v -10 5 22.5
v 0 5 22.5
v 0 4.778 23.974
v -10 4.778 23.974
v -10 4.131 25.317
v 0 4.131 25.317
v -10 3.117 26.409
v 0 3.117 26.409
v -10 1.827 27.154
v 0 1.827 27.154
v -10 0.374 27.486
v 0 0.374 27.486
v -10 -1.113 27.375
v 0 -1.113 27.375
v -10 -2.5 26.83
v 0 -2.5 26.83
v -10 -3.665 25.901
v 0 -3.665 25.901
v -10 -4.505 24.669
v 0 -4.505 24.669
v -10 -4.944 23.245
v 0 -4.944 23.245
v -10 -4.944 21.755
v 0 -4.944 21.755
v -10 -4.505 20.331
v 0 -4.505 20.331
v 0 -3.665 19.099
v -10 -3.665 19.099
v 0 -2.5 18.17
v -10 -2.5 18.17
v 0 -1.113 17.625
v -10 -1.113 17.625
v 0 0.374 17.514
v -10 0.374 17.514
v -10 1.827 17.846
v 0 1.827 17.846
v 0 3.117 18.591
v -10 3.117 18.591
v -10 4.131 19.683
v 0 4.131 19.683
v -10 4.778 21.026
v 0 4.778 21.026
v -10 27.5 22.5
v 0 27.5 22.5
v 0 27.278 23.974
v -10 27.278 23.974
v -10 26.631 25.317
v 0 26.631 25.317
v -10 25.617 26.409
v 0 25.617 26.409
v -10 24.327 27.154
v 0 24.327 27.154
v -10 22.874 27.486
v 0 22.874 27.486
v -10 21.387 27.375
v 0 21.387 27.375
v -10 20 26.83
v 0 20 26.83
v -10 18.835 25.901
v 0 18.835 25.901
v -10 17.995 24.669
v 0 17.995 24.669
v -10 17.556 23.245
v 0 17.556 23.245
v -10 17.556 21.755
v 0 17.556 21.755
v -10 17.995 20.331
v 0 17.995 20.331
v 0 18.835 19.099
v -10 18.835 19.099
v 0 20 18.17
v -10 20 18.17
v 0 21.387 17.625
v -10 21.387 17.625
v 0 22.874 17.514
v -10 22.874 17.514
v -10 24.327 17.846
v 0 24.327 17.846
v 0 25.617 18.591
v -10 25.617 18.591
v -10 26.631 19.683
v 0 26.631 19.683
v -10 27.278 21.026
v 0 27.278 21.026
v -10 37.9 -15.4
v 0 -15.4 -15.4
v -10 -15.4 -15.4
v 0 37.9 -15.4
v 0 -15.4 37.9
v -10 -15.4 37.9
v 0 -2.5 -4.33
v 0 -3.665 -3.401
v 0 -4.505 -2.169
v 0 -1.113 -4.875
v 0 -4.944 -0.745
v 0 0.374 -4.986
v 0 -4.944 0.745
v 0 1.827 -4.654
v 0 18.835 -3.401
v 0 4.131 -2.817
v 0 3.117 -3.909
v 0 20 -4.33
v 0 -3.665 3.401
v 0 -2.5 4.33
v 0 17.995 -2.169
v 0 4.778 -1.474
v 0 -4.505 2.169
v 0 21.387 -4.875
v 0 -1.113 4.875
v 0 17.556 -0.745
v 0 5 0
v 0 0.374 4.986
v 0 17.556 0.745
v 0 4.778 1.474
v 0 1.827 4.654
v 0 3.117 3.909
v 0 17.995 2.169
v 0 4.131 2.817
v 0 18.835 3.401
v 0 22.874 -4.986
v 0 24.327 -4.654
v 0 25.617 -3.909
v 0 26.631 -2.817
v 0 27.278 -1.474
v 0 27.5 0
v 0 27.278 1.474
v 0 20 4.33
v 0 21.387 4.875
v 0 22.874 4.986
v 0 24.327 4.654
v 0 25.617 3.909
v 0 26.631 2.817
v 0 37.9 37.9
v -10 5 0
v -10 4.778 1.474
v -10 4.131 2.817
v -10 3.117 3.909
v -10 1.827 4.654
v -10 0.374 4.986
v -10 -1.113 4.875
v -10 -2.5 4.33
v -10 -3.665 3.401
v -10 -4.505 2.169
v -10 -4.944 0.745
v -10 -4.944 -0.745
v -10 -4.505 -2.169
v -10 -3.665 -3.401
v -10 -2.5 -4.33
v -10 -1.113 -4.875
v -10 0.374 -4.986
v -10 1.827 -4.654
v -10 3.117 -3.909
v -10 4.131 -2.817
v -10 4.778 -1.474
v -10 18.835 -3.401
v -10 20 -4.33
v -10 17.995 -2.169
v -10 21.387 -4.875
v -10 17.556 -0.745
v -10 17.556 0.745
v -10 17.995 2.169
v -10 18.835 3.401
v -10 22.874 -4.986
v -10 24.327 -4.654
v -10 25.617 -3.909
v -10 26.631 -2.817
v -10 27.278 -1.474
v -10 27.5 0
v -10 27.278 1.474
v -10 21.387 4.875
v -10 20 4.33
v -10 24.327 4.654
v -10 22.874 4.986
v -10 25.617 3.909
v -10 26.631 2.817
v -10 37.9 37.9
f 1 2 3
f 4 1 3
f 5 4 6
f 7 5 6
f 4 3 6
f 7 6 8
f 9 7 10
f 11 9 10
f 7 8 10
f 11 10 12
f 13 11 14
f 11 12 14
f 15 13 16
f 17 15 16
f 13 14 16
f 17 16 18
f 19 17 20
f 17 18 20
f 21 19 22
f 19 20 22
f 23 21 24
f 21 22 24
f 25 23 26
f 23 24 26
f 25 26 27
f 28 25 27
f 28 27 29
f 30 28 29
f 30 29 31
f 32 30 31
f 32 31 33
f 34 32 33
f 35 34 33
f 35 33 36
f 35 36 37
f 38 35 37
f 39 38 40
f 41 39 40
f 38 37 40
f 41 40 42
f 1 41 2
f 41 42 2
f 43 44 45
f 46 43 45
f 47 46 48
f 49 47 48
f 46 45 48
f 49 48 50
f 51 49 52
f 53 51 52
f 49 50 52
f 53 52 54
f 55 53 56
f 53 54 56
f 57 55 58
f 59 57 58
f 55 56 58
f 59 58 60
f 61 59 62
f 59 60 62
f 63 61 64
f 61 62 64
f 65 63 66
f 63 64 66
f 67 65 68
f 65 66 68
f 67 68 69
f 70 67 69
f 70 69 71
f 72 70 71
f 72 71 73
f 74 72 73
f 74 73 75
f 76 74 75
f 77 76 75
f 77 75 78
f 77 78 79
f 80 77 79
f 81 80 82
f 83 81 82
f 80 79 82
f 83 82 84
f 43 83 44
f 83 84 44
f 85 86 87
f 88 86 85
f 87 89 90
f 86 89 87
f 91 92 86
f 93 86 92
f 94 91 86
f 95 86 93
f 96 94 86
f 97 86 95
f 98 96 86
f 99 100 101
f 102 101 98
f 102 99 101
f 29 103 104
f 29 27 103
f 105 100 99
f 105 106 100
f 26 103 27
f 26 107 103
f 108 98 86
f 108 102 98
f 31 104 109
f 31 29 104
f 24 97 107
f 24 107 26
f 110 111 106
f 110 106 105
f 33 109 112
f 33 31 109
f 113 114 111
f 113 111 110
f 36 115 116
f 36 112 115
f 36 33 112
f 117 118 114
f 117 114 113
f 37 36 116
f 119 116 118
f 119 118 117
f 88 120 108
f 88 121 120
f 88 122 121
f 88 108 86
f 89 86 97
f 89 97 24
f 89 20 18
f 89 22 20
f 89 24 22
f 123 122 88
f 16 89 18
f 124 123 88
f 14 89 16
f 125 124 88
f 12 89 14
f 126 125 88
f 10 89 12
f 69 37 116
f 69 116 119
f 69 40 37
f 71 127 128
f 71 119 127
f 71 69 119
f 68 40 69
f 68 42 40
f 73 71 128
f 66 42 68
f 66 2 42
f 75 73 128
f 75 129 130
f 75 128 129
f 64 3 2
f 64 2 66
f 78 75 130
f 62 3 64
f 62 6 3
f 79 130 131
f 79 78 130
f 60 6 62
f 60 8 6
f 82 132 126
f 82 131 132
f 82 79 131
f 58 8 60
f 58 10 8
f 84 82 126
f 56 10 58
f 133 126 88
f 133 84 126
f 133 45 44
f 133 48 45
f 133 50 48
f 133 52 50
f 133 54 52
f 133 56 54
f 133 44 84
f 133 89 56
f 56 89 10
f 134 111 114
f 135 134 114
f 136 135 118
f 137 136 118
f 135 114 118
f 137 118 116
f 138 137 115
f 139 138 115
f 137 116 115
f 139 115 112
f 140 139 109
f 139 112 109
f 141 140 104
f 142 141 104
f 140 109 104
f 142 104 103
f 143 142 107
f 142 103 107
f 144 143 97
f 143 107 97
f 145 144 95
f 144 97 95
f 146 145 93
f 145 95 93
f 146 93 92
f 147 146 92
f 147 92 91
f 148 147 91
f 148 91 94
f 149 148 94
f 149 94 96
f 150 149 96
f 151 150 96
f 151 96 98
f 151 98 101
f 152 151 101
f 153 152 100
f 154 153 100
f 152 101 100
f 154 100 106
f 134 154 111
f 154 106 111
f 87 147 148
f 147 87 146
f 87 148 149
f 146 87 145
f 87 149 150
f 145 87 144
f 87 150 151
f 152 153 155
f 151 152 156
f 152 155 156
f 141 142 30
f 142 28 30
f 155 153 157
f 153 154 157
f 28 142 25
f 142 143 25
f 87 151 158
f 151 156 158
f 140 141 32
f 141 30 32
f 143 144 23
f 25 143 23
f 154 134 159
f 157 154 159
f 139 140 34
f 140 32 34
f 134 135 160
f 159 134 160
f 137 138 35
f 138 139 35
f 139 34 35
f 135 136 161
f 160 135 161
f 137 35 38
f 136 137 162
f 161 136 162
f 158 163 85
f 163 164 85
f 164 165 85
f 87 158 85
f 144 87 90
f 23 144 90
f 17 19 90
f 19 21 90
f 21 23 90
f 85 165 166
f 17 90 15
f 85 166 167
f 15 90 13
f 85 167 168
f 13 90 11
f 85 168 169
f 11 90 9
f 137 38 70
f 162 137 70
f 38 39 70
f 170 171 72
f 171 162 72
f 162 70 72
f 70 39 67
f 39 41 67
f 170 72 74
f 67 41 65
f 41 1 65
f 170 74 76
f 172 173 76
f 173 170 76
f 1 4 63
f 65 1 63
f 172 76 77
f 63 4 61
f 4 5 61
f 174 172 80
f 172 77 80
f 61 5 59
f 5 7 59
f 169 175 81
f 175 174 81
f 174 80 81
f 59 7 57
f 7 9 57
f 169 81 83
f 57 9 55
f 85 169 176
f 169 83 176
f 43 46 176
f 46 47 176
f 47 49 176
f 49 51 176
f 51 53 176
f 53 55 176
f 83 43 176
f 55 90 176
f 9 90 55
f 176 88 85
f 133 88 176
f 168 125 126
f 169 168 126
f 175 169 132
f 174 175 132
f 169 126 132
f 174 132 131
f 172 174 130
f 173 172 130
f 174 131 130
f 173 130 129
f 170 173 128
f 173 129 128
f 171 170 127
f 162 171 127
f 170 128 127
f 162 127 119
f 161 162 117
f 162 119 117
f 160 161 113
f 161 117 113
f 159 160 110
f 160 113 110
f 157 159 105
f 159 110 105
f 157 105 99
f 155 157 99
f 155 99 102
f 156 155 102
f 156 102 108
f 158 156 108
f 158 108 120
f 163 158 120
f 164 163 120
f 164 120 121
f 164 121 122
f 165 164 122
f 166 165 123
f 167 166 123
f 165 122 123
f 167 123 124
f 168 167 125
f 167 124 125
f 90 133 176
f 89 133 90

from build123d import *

# Parameters (mm, degrees)
F0_R     = 5
F1_DEPTH = 10


with BuildPart() as f1:
    # F0 (on Right) → F1 (new body)
    with BuildSketch(Plane.YZ):
        Polygon((22.5, 37.9), (0, 37.9), (-15.4, 37.9), (-15.4, 15), (-15.4, 7.5), (-15.4, -15.4), (0, -15.4), (22.5, -15.4), (37.9, -15.4), (37.9, 0), (37.9, 22.5), (37.9, 37.9), align=None)
        Circle(F0_R, mode=Mode.SUBTRACT)
        with Locations((22.5, 0)):
            Circle(F0_R, mode=Mode.SUBTRACT)
        with Locations((0, 22.5)):
            Circle(F0_R, mode=Mode.SUBTRACT)
        with Locations((22.5, 22.5)):
            Circle(F0_R, mode=Mode.SUBTRACT)
    extrude(amount=-F1_DEPTH)


solid = f1.part
